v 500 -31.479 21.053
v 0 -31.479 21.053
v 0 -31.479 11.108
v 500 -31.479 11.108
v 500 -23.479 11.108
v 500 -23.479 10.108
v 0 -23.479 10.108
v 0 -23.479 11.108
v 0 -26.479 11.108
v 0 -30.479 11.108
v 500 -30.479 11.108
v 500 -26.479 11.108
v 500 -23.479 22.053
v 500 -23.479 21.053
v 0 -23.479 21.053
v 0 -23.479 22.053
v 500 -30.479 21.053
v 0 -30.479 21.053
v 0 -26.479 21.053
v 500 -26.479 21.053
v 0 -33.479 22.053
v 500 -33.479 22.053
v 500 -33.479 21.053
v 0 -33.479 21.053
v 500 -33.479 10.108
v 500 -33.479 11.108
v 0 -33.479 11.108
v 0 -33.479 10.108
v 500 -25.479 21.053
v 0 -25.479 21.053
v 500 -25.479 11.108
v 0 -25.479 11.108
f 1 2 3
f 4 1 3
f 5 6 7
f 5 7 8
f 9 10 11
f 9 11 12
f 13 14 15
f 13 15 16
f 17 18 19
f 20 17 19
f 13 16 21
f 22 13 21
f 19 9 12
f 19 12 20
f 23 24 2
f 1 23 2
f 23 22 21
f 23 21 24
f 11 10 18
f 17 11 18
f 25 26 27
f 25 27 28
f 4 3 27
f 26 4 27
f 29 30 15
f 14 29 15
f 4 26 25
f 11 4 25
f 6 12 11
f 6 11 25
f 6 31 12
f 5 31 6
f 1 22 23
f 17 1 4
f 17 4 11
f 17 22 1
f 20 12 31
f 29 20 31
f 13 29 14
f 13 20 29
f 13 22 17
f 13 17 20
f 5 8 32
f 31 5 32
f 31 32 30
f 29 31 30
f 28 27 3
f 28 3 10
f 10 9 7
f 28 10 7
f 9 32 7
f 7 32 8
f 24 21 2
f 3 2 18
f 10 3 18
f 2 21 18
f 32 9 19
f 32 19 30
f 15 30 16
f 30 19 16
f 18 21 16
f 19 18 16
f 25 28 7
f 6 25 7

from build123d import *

# Parameters (mm, degrees)
F0_W     = 4
F0_H     = 9.9456192771
F1_DEPTH = 500


with BuildPart() as f1:
    # F0 (on Right) → F1 (new body)
    with BuildSketch(Plane.YZ):
        Polygon((-23.479051888, 22.0532231033), (-33.479051888, 22.0532231033), (-33.479051888, 21.0532231033), (-31.479051888, 21.0532231033), (-31.479051888, 11.1076038262), (-33.479051888, 11.1076038262), (-33.479051888, 10.1076038262), (-23.479051888, 10.1076038262), (-23.479051888, 11.1076038262), (-25.479051888, 11.1076038262), (-25.479051888, 21.0532231033), (-23.479051888, 21.0532231033), align=None)
        with Locations((-28.479051888, 16.0804134647)):
            Rectangle(F0_W, F0_H, mode=Mode.SUBTRACT)
    extrude(amount=F1_DEPTH)


solid = f1.part
